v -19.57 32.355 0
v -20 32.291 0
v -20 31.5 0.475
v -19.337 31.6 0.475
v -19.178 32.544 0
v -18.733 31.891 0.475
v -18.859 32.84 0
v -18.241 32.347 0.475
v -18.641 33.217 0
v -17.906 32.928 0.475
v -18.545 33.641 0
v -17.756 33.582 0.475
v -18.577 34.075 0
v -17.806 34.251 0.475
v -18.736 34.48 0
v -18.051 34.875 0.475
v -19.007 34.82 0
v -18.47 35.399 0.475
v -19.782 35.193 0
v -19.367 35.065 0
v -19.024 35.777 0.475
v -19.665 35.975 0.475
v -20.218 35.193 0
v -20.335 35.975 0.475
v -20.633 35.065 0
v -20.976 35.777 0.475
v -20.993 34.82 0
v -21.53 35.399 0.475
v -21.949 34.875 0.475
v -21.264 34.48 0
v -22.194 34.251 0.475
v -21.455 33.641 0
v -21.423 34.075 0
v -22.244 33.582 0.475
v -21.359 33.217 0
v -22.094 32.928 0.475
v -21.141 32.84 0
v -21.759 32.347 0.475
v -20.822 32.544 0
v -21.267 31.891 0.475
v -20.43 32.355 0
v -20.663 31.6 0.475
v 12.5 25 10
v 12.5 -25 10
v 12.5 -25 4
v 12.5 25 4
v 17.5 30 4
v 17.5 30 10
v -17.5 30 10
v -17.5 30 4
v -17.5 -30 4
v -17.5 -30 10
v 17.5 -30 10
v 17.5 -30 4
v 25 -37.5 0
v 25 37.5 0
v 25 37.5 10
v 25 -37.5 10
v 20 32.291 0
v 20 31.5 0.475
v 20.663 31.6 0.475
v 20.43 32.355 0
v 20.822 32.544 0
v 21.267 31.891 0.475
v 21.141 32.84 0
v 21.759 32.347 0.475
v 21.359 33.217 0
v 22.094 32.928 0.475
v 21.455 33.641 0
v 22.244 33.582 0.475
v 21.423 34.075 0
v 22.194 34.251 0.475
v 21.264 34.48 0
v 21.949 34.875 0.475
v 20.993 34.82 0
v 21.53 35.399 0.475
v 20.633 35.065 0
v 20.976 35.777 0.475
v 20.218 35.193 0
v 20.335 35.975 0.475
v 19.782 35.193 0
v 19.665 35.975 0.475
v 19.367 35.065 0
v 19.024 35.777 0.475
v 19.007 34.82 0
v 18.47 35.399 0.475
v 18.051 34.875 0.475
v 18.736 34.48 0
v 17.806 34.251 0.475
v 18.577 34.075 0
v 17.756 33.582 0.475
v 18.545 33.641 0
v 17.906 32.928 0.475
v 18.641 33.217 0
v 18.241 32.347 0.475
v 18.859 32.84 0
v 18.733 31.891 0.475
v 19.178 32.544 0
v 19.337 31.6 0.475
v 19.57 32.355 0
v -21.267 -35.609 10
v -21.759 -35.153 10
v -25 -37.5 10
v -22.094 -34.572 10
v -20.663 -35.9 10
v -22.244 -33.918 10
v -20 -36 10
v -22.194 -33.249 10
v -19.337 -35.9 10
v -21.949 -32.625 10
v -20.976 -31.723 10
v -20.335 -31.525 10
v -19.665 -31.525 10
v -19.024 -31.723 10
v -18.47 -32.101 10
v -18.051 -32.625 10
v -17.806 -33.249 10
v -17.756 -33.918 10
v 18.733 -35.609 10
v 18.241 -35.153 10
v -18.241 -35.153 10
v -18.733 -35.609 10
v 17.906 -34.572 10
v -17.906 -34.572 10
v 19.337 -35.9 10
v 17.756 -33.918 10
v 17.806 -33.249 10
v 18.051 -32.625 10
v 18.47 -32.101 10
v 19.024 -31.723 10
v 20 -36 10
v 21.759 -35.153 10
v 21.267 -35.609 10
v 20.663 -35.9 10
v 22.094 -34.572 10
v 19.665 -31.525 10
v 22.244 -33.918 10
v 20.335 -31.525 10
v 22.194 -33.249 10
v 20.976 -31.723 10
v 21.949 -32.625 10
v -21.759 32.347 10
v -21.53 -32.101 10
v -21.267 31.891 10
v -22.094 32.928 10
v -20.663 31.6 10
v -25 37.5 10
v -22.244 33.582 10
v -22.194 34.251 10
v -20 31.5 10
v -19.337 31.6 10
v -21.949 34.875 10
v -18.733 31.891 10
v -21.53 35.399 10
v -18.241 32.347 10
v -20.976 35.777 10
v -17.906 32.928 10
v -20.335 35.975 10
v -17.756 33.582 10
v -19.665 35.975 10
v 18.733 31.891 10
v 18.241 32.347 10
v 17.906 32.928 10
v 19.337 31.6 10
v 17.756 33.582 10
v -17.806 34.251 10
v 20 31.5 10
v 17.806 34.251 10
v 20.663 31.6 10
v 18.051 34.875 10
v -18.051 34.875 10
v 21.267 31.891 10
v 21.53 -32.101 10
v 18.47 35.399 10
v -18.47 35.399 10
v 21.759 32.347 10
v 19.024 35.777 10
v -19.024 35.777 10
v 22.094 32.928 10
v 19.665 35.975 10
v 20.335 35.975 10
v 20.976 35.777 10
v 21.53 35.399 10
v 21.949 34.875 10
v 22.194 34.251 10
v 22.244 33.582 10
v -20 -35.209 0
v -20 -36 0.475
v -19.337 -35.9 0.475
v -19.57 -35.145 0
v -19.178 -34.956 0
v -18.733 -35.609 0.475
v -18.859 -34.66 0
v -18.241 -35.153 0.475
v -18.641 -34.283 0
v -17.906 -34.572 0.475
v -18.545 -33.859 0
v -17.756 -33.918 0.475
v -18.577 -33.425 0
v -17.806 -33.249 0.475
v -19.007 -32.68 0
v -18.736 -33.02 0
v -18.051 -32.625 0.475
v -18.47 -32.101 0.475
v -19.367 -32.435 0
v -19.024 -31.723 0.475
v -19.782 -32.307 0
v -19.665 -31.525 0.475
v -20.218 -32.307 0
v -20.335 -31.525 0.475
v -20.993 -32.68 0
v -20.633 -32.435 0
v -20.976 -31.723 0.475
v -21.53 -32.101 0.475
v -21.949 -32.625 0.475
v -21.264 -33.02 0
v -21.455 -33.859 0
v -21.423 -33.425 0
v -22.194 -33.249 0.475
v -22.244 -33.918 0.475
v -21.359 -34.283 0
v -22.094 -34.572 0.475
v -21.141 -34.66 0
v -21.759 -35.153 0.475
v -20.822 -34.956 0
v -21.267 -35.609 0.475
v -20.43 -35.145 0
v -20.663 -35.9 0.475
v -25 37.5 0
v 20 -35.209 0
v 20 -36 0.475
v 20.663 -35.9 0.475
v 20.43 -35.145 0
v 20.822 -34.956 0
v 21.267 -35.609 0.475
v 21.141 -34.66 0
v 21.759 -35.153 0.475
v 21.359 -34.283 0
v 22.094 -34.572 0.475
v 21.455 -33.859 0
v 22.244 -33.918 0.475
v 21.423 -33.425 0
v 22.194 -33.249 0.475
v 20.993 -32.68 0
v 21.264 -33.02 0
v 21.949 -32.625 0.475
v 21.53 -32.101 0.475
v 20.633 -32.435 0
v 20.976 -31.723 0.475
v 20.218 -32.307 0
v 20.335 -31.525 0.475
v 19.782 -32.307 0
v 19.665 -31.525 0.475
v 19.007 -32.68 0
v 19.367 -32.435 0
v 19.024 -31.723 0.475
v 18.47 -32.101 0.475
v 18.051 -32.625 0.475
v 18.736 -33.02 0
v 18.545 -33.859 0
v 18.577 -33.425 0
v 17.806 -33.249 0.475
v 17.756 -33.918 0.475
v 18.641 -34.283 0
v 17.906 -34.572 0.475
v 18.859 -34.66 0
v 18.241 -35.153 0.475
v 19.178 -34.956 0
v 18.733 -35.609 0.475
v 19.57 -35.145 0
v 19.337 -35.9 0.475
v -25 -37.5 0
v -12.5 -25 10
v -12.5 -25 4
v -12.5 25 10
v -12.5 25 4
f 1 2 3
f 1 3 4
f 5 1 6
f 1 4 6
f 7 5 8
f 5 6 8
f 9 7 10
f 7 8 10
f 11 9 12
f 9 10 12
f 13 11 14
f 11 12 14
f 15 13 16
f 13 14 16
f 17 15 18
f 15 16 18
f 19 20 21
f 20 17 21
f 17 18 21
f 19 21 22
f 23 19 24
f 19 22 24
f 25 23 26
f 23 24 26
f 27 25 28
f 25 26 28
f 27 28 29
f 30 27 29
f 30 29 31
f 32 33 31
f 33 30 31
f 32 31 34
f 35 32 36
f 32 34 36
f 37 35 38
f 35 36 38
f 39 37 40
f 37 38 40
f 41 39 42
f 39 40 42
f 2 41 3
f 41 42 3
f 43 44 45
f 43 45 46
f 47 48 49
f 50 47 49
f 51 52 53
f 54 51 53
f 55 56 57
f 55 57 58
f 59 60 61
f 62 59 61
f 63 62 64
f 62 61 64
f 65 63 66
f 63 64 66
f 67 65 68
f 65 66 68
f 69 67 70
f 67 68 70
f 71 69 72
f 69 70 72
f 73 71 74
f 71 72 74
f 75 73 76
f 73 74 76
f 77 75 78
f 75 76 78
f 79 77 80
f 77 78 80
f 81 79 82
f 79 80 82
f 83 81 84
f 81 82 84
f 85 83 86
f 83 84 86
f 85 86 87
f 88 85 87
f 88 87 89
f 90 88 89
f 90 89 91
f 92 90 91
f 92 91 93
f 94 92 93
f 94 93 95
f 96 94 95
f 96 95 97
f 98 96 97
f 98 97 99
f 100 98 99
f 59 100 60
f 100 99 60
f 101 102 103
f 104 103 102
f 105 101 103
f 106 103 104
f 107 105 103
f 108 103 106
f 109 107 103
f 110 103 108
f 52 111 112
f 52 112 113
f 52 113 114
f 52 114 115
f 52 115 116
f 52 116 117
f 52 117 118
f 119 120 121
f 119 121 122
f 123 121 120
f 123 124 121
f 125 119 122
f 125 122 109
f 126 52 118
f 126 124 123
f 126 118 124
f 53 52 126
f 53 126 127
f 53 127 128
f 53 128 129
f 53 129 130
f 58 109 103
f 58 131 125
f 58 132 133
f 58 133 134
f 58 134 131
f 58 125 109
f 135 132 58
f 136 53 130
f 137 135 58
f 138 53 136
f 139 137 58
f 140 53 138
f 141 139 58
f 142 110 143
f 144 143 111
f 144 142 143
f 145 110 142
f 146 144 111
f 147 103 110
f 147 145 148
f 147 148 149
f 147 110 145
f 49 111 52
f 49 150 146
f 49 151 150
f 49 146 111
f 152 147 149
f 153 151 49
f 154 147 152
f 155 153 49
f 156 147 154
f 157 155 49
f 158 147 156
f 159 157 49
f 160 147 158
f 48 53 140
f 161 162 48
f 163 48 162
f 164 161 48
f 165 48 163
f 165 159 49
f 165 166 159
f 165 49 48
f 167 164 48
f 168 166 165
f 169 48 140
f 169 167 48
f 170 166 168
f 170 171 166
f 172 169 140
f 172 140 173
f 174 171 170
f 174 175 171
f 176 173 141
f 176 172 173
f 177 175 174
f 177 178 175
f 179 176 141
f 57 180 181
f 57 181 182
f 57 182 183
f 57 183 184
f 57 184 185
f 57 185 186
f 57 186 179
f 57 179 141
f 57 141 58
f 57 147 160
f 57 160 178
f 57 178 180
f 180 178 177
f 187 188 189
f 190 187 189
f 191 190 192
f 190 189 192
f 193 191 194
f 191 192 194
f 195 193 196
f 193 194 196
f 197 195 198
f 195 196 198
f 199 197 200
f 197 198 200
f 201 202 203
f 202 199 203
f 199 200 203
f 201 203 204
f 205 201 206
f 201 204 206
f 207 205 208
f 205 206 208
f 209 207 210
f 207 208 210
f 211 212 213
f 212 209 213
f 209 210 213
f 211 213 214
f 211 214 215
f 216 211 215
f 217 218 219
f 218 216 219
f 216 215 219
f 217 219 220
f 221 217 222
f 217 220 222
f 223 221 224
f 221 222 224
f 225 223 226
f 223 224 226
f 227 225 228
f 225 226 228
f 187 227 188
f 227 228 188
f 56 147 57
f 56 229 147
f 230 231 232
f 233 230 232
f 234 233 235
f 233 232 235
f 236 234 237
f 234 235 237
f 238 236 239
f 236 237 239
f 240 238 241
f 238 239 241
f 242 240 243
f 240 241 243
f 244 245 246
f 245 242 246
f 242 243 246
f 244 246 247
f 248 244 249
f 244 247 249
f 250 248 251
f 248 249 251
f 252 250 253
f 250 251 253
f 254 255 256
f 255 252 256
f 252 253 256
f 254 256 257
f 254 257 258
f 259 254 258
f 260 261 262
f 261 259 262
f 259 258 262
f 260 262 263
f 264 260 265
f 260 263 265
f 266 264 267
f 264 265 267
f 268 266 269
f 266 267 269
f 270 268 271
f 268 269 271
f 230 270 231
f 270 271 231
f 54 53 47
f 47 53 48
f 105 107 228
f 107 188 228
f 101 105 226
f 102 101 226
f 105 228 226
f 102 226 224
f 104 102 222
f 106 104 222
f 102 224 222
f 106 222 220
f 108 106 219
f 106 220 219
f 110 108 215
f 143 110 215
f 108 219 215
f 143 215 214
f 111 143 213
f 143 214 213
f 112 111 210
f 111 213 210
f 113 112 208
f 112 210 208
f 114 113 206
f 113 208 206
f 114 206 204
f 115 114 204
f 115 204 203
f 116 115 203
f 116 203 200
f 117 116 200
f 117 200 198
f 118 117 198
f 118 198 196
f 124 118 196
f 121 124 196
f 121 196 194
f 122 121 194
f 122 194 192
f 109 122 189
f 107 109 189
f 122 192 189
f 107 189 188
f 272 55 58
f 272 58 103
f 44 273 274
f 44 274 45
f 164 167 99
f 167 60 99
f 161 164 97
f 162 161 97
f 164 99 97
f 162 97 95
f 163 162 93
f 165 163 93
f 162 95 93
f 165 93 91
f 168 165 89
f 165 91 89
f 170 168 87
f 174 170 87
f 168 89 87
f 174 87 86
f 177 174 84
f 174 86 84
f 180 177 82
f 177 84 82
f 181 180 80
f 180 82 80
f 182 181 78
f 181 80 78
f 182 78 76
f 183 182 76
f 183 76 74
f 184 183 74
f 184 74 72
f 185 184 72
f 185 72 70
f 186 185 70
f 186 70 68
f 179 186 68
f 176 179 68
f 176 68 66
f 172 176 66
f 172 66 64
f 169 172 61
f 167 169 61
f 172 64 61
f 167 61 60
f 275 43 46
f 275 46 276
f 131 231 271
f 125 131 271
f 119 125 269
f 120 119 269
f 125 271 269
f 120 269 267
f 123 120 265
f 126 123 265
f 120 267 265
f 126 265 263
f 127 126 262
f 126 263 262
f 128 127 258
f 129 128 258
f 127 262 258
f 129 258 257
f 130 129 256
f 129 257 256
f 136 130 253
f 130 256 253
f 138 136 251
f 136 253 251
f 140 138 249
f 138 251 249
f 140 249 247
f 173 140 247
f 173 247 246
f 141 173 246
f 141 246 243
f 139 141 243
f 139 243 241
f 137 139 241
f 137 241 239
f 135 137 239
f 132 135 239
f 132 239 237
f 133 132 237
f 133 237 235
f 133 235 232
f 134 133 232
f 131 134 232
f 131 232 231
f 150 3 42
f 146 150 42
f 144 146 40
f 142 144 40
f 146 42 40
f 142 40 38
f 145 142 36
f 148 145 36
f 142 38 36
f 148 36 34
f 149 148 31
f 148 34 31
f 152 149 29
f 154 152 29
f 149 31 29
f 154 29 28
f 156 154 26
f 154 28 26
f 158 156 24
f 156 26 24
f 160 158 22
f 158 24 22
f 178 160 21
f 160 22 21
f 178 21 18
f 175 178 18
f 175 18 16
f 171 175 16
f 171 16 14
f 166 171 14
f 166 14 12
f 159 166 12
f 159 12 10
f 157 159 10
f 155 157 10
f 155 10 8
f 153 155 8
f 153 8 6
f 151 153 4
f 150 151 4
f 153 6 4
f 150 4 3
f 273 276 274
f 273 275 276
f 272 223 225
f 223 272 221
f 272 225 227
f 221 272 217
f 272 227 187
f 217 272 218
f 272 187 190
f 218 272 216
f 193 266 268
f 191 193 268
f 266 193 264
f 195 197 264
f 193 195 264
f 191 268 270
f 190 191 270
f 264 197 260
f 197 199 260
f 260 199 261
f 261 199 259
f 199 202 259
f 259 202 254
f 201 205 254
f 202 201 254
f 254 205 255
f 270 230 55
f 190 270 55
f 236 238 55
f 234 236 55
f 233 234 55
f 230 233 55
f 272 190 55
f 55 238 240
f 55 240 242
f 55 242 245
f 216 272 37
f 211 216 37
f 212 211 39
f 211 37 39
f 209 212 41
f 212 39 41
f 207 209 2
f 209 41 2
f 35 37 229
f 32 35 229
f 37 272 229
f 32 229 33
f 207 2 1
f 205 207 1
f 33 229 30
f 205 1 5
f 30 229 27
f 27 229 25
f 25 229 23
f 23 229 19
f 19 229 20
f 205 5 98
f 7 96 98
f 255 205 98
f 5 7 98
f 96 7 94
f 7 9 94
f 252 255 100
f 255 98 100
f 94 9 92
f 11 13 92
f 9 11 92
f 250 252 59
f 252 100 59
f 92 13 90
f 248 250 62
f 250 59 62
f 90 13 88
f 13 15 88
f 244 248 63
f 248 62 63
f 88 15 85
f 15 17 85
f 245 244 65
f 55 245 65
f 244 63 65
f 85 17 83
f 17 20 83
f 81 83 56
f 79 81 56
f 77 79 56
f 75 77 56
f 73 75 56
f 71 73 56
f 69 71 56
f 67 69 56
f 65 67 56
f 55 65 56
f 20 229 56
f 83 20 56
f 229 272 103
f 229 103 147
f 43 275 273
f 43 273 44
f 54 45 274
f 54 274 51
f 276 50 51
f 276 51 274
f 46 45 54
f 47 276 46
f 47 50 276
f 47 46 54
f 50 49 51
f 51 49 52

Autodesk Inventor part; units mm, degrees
ref_plane "YZ Plane" through (0, 0, 0) normal (1, 0, 0) x (0, 1, 0)
ref_plane "XZ Plane" through (0, 0, 0) normal (0, 1, 0) x (-1, 0, 0)
ref_plane "XY Plane" through (0, 0, 0) normal (0, 0, 1) x (1, 0, 0)
sketch "Sketch1" plane through (0, 0, 0) normal (0, 0, 1) x (1, 0, 0)
  line L0 (-25, 37.5) -> (25, 37.5)
  line L1 (25, 37.5) -> (25, -37.5)
  line L2 (25, -37.5) -> (-25, -37.5)
  line L3 (-25, -37.5) -> (-25, 37.5)
  point P0 (0, 0)
  dimension "d0" = 50
  dimension "d1" = 75
  dimension "d2" = 37.5
  dimension "d3" = 25
extrude "Extrusion1" add sketch "Sketch1" along normal blind 10
sketch "Sketch2" plane through (0, 0, 10) normal (0, 0, 1) x (1, 0, 0)
  point P0 (0, 0)
  point P1 (20, -33.75)
  point P2 (-20, -33.75)
  point P3 (-20, 33.75)
  point P4 (20, 33.75)
  dimension "d6" = 40
  dimension "d7" = 20
  dimension "d8" = 67.5
  dimension "d9" = 33.75
hole "Hole1" at (20, -33.75, 10) at (-20, -33.75, 10) at (-20, 33.75, 10) at (20, 33.75, 10) direction (0, 0, -1) diameter 4.5 depth 9.525 tip angle 118 clearance for "Countersunk Flat Head Screw ISO 2009/7046" size "M4" standard "ISO"
sketch "Sketch3" plane through (0, 0, 10) normal (0, 0, 1) x (1, 0, 0)
  line L0 (-17.5, -30) -> (17.5, -30)
  line L1 (17.5, -30) -> (17.5, 30)
  line L2 (17.5, 30) -> (-17.5, 30)
  line L3 (-17.5, 30) -> (-17.5, -30)
  line L4 (-12.5, -25) -> (12.5, -25)
  line L5 (12.5, -25) -> (12.5, 25)
  line L6 (12.5, 25) -> (-12.5, 25)
  line L7 (-12.5, 25) -> (-12.5, -25)
  point P0 (0, 0)
  dimension "d19" = 35
  dimension "d22" = 60
  dimension "d23" = 30
  dimension "d24" = 5
  dimension "d26" = 17.5
  dimension "d27" = 5
  dimension "d29" = 5
  dimension "d30" = 5
extrude "Extrusion2" cut sketch "Sketch3" against normal blind 6
equation "\"d2\" = 0.5 * d1"
equation "\"d3\" = 0.5 * d0"
equation "\"d7\" = 0.5 * d6"
equation "\"d9\" = 0.5 * d8"
equation "\"d23\" = 0.5 * d22"
equation "\"d26\" = 0.5 * d19"
equation "\"d27\" = d24"
equation "\"d29\" = d24"
equation "\"d30\" = d24"
properties part number "filipeSampleHolderBase"
